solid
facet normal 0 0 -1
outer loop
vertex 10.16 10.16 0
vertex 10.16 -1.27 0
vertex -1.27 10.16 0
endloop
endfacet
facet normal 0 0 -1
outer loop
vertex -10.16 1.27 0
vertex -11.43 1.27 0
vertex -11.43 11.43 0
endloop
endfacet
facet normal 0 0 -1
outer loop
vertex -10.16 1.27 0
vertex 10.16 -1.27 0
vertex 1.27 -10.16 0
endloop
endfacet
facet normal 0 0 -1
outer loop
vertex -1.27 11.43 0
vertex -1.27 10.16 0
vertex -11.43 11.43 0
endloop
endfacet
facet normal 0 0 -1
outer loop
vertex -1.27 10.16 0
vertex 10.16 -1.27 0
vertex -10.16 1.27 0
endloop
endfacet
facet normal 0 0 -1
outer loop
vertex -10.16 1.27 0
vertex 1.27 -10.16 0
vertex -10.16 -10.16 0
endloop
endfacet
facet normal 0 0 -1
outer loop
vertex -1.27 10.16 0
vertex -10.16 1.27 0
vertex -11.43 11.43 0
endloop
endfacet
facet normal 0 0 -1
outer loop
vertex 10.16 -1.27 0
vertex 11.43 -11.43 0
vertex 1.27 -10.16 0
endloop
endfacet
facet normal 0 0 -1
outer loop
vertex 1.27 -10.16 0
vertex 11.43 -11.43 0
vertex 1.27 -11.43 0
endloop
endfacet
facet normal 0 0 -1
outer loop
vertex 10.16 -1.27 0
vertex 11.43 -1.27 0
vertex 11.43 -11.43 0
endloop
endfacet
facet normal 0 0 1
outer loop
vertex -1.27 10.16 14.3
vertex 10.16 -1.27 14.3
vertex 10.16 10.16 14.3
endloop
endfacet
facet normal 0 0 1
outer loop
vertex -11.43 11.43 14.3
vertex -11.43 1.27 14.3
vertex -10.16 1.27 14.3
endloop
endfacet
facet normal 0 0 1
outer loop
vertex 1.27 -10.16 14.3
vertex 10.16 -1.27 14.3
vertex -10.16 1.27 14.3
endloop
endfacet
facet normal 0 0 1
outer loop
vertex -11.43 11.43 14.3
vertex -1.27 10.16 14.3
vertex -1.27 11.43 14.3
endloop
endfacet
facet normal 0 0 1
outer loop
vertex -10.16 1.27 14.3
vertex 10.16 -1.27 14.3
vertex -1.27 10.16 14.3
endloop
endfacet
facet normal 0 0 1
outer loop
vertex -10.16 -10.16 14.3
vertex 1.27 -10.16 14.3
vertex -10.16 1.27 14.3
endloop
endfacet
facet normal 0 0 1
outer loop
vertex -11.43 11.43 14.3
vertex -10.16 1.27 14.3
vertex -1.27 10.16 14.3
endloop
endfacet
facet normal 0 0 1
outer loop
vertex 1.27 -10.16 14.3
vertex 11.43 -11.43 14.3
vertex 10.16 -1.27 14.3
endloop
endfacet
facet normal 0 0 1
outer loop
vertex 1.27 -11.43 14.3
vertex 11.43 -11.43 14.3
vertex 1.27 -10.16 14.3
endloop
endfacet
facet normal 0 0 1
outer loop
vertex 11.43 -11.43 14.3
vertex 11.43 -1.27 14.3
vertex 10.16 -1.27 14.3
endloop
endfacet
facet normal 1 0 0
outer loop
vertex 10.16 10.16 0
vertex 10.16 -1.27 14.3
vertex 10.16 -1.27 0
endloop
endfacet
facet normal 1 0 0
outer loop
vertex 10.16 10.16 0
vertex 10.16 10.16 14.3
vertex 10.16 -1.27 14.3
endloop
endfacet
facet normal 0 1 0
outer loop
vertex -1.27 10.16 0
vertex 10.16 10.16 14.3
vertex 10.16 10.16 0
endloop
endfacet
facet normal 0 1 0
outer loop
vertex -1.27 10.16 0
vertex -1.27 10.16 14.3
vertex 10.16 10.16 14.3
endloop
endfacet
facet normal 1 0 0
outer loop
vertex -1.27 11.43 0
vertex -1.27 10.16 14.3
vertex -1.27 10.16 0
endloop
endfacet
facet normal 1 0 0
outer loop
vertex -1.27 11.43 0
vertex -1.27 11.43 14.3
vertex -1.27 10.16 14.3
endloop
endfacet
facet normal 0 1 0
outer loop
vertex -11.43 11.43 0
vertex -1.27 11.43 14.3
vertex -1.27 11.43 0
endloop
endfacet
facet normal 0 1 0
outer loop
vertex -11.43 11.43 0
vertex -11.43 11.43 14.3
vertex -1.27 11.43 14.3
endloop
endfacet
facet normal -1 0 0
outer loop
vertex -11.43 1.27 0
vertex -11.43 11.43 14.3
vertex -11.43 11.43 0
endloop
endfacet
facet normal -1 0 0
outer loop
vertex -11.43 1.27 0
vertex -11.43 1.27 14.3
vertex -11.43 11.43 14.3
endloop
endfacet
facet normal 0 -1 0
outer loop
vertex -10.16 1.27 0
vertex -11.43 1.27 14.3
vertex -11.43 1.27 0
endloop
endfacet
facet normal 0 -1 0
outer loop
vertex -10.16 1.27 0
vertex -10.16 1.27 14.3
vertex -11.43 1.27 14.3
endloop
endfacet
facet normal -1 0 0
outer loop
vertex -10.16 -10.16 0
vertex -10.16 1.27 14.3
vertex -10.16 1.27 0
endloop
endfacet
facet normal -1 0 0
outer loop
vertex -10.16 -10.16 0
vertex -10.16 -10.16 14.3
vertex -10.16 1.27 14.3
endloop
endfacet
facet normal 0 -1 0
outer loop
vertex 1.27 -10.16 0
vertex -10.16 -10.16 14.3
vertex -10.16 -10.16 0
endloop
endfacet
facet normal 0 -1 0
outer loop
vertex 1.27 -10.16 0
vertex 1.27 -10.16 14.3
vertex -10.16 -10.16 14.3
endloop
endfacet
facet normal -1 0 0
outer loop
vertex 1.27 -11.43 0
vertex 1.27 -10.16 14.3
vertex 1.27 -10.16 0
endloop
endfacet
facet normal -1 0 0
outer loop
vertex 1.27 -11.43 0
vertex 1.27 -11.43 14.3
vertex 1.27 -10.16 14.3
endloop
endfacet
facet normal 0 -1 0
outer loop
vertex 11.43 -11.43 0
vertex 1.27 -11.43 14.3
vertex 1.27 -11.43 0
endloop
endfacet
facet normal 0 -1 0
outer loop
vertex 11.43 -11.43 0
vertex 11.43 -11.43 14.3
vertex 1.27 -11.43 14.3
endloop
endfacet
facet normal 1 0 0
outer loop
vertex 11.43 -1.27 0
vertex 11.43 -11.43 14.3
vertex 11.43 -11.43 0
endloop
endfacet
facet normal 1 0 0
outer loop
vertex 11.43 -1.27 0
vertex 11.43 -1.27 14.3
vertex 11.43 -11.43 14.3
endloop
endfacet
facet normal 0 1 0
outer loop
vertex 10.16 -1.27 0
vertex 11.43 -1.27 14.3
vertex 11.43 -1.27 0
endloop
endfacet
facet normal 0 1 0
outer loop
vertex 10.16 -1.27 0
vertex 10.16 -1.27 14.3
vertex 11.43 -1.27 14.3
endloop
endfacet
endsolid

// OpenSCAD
// datasheet: https://www.tdk-electronics.tdk.com/inf/80/db/fer/rm_8.pdf
// This is very primitive model, but it will do the job

CHASSIS_Z_LENGTH = 14.3;

// Increase steps in render to have quality circles
$fs=0.01;


module Transformer() {
    rotate([0,0,90])
    linear_extrude(height = CHASSIS_Z_LENGTH, convexity = 10, twist = 0)
        polygon(points = [
            [-11.43, -11.43],
            [-1.27,  -11.43],
            [-1.27, -10.16],
            [10.16, -10.16],
            [10.16,   1.27],
            [11.43,   1.27],
            [11.43,  11.43],
            [1.27,   11.43],
            [1.27,   10.16],
            [-10.16, 10.16],
            [-10.16, -1.27],
            [-11.43, -1.27],
            [-11.43, -11.43]] // return back to the first point
        );
}

Transformer();
